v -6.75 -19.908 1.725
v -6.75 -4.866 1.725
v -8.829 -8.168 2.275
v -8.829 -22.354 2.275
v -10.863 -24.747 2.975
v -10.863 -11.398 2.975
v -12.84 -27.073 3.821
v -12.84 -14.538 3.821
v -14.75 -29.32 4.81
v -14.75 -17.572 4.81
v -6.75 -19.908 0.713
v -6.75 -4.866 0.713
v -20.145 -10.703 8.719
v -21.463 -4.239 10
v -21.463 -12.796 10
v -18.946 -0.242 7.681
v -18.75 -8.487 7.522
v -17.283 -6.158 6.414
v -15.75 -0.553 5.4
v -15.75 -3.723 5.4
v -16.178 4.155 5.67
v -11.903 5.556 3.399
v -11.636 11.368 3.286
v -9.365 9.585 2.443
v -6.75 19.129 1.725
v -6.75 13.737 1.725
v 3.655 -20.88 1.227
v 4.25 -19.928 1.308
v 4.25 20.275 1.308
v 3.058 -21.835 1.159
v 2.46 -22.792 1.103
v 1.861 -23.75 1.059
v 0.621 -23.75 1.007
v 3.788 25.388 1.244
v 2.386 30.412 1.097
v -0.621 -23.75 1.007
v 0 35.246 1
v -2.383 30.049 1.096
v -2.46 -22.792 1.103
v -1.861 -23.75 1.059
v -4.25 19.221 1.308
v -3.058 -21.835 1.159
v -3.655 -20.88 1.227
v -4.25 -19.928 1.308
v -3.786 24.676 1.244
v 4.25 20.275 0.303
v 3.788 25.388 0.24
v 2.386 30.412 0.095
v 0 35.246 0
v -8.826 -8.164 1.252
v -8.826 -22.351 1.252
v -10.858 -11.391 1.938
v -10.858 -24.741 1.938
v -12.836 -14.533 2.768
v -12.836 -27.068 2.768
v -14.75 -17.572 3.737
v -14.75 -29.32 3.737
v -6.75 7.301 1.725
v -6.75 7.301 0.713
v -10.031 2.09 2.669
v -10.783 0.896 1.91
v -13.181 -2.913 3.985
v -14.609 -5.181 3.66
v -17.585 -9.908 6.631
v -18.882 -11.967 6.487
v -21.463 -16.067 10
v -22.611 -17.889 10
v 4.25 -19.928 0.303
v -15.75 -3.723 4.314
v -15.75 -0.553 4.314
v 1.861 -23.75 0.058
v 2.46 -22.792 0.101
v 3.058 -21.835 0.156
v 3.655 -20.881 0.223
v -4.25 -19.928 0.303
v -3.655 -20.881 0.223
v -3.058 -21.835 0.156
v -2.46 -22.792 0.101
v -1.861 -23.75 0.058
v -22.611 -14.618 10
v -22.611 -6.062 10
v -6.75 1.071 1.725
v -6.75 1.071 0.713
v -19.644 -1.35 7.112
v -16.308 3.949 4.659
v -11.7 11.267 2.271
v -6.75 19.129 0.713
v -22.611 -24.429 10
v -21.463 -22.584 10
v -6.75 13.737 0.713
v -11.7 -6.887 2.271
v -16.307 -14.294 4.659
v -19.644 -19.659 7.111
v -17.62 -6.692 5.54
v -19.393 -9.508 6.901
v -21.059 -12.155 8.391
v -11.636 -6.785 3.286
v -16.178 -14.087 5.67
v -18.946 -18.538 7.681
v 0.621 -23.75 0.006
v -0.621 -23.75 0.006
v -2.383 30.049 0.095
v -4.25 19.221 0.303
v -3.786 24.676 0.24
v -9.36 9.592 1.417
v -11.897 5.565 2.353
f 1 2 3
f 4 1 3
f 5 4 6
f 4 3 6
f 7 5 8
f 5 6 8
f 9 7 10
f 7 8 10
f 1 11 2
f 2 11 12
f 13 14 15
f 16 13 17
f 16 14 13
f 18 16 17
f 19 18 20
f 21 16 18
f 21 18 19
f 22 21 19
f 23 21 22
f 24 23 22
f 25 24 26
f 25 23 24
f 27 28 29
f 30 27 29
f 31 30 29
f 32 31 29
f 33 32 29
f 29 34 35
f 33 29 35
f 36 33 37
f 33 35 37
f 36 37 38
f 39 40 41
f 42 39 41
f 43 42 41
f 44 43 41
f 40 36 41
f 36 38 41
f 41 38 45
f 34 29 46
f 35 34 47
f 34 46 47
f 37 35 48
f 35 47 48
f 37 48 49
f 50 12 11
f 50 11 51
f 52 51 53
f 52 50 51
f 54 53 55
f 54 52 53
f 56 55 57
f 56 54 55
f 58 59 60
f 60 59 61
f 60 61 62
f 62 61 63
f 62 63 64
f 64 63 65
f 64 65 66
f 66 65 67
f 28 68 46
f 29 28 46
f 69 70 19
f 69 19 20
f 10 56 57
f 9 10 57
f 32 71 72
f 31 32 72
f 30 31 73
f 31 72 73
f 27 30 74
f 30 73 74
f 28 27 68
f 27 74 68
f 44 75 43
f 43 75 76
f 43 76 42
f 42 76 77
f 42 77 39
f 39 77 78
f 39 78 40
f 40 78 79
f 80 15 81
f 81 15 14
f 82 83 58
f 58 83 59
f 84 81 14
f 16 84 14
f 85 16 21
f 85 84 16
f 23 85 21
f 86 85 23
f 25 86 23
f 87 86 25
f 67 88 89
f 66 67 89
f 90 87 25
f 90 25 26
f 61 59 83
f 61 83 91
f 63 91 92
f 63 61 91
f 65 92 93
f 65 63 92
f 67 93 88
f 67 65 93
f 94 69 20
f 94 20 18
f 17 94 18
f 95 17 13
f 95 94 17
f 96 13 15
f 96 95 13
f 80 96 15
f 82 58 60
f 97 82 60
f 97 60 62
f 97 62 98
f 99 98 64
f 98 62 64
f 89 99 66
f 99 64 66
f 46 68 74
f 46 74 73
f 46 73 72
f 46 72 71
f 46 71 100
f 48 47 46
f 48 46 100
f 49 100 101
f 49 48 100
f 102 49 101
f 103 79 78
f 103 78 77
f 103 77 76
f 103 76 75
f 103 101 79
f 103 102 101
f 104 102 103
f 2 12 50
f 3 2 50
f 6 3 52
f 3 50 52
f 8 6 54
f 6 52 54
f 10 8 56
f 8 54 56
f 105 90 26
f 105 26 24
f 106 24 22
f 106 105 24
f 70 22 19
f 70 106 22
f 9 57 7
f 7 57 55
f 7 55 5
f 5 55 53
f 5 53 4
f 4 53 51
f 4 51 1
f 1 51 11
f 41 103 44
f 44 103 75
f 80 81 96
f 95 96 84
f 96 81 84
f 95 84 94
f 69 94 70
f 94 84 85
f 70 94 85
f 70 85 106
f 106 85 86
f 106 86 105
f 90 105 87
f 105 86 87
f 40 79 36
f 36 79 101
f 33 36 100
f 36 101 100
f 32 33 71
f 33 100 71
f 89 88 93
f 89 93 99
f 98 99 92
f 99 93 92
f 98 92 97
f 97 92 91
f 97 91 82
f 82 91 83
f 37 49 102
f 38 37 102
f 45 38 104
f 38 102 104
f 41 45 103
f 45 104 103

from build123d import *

# Parameters (mm, degrees)
PAD_DEPTH       = 10
SKETCH005_R     = 39.820196
SKETCH005_R_2   = 30
POCKET_DEPTH    = 59.751
SKETCH006_R     = 29.5
POCKET001_DEPTH = 59.7510001
PAD001_DEPTH    = 10
SKETCH013_R     = 50.974494
SKETCH013_R_2   = 30
POCKET008_DEPTH = 24.4546040917
SKETCH014_R     = 29.5
POCKET009_DEPTH = 24.4546040917
PAD002_DEPTH    = 10
SKETCH009_R     = 40.247183
SKETCH009_R_2   = 30
POCKET004_DEPTH = 32.7594311894
SKETCH010_R     = 29.5
POCKET005_DEPTH = 31.7315339679
PAD003_DEPTH    = 10
SKETCH011_R     = 42.648323
SKETCH011_R_2   = 30
POCKET006_DEPTH = 34.7635181932
SKETCH012_R     = 29.5
POCKET007_DEPTH = 33.7481977609


with BuildPart() as main_body:
    # Sketch → Pad (new body)
    with BuildSketch(Plane.XY):
        with BuildLine():
            Line((-4.25, 19.2207216746), (-4.25, -19.9283009434))
            Line((-4.25, -19.9283009434), (-1.8614380896, -23.75))
            Line((-1.8614380896, -23.75), (1.8614380896, -23.75))
            Line((1.8614380896, -23.75), (4.25, -19.9283009434))
            Line((4.25, -19.9283009434), (4.25, 20.2751417602))
            ThreePointArc((4.25, 20.2751417602), (3.1669148644, 28.0564066396), (0, 35.2461080782))
            ThreePointArc((0, 35.2461080782), (-3.1694471872, 27.5104066714), (-4.25, 19.2207216746))
        make_face()
    extrude(amount=PAD_DEPTH)

    # Sketch005 (on DatumPlane) → Pocket (cut, through all)
    with BuildSketch(Plane(origin=(0, 36, 0), x_dir=(-1, 0, 0), z_dir=(0, 1, 0))):
        with Locations((0, 30)):
            Circle(SKETCH005_R)
        with Locations((0, 30)):
            Circle(SKETCH005_R_2, mode=Mode.SUBTRACT)
    extrude(amount=-POCKET_DEPTH, mode=Mode.SUBTRACT)

    # Sketch006 (on DatumPlane) → Pocket001 (cut, through all)
    with BuildSketch(Plane(origin=(0, 36, 0), x_dir=(-1, 0, 0), z_dir=(0, 1, 0))):
        with Locations((0, 30.5)):
            Circle(SKETCH006_R)
    extrude(amount=-POCKET001_DEPTH, mode=Mode.SUBTRACT)


with BuildPart() as body004:
    # Sketch001 → Pad001 (new body)
    with BuildSketch(Plane.XY):
        Polygon((6.75, -19.9081057427), (6.75, -4.8662663569), (14.75, -17.5721487098), (14.75, -29.3198704486), align=None)
    extrude(amount=PAD001_DEPTH)

    # Sketch013 (on DatumPlane) → Pocket008 (cut, through all)
    with BuildSketch(Plane(origin=(6.75, -4.8662663569, 0), x_dir=(1, 0, 0), z_dir=(0, -1, 0))):
        with Locations((-6.5, 30)):
            Circle(SKETCH013_R)
        with Locations((-6.5, 30)):
            Circle(SKETCH013_R_2, mode=Mode.SUBTRACT)
    extrude(amount=POCKET008_DEPTH, mode=Mode.SUBTRACT)

    # Sketch014 (on DatumPlane) → Pocket009 (cut, through all)
    with BuildSketch(Plane(origin=(6.75, -4.8662663569, 0), x_dir=(1, 0, 0), z_dir=(0, -1, 0))):
        with Locations((-6.5, 30.5)):
            Circle(SKETCH014_R)
    extrude(amount=POCKET009_DEPTH, mode=Mode.SUBTRACT)


with BuildPart() as lower_left_wing:
    # Part__Mirroring: instance of Body004
    add(body004.part.mirror(Plane(origin=(0, 0, 0), x_dir=(0, -1, 0), z_dir=(1, 0, 0))))


with BuildPart() as body005:
    # Sketch002 → Pad002 (new body)
    with BuildSketch(Plane.XY):
        Polygon((6.75, 7.3011824717), (23.25, -18.9046998813), (23.25, -25.4572487177), (6.75, 1.0714038899), align=None)
    extrude(amount=PAD002_DEPTH)

    # Sketch009 (on DatumPlane) → Pocket004 (cut, through all)
    with BuildSketch(Plane(origin=(6.75, 7.3011824717, 0), x_dir=(1, 0, 0), z_dir=(0, -1, 0))):
        with Locations((-6.5, 30)):
            Circle(SKETCH009_R)
        with Locations((-6.5, 30)):
            Circle(SKETCH009_R_2, mode=Mode.SUBTRACT)
    extrude(amount=POCKET004_DEPTH, mode=Mode.SUBTRACT)

    # Sketch010 (on DatumPlane) → Pocket005 (cut, through all)
    with BuildSketch(Plane(origin=(6.75, 7.3011824717, 0), x_dir=(1, 0, 0), z_dir=(0, -1, 0))):
        with Locations((-6.5, 30.5)):
            Circle(SKETCH010_R)
    extrude(amount=POCKET005_DEPTH, mode=Mode.SUBTRACT)


with BuildPart() as mid_left_wing:
    # Part__Mirroring001: instance of Body005
    add(body005.part.mirror(Plane(origin=(0, 0, 0), x_dir=(0, -1, 0), z_dir=(1, 0, 0))))


with BuildPart() as body006:
    # Sketch003 → Pad003 (new body)
    with BuildSketch(Plane.XY):
        Polygon((6.75, 19.1287336431), (6.75, 13.7371663015), (15.75, -0.5528336985), (15.75, -3.7228470501), (23.25, -15.6337845501), (23.25, -7.0771487098), align=None)
    extrude(amount=PAD003_DEPTH)

    # Sketch011 (on Plane of DatumPlane003) → Pocket006 (cut, through all)
    with BuildSketch(Plane(origin=(6.75, 19.1287336431, 0), x_dir=(-1, 0, 0), z_dir=(0, 1, 0))):
        with Locations((6.5, 30)):
            Circle(SKETCH011_R)
        with Locations((6.5, 30)):
            Circle(SKETCH011_R_2, mode=Mode.SUBTRACT)
    extrude(amount=-POCKET006_DEPTH, mode=Mode.SUBTRACT)

    # Sketch012 (on DatumPlane) → Pocket007 (cut, through all)
    with BuildSketch(Plane(origin=(6.75, 19.1287336431, 0), x_dir=(-1, 0, 0), z_dir=(0, 1, 0))):
        with Locations((6.5, 30.5)):
            Circle(SKETCH012_R)
    extrude(amount=-POCKET007_DEPTH, mode=Mode.SUBTRACT)


with BuildPart() as upper_left_wing:
    # Part__Mirroring002: instance of Body006
    add(body006.part.mirror(Plane(origin=(0, 0, 0), x_dir=(0, -1, 0), z_dir=(1, 0, 0))))


solid = Compound([main_body.part, lower_left_wing.part, mid_left_wing.part, upper_left_wing.part])
